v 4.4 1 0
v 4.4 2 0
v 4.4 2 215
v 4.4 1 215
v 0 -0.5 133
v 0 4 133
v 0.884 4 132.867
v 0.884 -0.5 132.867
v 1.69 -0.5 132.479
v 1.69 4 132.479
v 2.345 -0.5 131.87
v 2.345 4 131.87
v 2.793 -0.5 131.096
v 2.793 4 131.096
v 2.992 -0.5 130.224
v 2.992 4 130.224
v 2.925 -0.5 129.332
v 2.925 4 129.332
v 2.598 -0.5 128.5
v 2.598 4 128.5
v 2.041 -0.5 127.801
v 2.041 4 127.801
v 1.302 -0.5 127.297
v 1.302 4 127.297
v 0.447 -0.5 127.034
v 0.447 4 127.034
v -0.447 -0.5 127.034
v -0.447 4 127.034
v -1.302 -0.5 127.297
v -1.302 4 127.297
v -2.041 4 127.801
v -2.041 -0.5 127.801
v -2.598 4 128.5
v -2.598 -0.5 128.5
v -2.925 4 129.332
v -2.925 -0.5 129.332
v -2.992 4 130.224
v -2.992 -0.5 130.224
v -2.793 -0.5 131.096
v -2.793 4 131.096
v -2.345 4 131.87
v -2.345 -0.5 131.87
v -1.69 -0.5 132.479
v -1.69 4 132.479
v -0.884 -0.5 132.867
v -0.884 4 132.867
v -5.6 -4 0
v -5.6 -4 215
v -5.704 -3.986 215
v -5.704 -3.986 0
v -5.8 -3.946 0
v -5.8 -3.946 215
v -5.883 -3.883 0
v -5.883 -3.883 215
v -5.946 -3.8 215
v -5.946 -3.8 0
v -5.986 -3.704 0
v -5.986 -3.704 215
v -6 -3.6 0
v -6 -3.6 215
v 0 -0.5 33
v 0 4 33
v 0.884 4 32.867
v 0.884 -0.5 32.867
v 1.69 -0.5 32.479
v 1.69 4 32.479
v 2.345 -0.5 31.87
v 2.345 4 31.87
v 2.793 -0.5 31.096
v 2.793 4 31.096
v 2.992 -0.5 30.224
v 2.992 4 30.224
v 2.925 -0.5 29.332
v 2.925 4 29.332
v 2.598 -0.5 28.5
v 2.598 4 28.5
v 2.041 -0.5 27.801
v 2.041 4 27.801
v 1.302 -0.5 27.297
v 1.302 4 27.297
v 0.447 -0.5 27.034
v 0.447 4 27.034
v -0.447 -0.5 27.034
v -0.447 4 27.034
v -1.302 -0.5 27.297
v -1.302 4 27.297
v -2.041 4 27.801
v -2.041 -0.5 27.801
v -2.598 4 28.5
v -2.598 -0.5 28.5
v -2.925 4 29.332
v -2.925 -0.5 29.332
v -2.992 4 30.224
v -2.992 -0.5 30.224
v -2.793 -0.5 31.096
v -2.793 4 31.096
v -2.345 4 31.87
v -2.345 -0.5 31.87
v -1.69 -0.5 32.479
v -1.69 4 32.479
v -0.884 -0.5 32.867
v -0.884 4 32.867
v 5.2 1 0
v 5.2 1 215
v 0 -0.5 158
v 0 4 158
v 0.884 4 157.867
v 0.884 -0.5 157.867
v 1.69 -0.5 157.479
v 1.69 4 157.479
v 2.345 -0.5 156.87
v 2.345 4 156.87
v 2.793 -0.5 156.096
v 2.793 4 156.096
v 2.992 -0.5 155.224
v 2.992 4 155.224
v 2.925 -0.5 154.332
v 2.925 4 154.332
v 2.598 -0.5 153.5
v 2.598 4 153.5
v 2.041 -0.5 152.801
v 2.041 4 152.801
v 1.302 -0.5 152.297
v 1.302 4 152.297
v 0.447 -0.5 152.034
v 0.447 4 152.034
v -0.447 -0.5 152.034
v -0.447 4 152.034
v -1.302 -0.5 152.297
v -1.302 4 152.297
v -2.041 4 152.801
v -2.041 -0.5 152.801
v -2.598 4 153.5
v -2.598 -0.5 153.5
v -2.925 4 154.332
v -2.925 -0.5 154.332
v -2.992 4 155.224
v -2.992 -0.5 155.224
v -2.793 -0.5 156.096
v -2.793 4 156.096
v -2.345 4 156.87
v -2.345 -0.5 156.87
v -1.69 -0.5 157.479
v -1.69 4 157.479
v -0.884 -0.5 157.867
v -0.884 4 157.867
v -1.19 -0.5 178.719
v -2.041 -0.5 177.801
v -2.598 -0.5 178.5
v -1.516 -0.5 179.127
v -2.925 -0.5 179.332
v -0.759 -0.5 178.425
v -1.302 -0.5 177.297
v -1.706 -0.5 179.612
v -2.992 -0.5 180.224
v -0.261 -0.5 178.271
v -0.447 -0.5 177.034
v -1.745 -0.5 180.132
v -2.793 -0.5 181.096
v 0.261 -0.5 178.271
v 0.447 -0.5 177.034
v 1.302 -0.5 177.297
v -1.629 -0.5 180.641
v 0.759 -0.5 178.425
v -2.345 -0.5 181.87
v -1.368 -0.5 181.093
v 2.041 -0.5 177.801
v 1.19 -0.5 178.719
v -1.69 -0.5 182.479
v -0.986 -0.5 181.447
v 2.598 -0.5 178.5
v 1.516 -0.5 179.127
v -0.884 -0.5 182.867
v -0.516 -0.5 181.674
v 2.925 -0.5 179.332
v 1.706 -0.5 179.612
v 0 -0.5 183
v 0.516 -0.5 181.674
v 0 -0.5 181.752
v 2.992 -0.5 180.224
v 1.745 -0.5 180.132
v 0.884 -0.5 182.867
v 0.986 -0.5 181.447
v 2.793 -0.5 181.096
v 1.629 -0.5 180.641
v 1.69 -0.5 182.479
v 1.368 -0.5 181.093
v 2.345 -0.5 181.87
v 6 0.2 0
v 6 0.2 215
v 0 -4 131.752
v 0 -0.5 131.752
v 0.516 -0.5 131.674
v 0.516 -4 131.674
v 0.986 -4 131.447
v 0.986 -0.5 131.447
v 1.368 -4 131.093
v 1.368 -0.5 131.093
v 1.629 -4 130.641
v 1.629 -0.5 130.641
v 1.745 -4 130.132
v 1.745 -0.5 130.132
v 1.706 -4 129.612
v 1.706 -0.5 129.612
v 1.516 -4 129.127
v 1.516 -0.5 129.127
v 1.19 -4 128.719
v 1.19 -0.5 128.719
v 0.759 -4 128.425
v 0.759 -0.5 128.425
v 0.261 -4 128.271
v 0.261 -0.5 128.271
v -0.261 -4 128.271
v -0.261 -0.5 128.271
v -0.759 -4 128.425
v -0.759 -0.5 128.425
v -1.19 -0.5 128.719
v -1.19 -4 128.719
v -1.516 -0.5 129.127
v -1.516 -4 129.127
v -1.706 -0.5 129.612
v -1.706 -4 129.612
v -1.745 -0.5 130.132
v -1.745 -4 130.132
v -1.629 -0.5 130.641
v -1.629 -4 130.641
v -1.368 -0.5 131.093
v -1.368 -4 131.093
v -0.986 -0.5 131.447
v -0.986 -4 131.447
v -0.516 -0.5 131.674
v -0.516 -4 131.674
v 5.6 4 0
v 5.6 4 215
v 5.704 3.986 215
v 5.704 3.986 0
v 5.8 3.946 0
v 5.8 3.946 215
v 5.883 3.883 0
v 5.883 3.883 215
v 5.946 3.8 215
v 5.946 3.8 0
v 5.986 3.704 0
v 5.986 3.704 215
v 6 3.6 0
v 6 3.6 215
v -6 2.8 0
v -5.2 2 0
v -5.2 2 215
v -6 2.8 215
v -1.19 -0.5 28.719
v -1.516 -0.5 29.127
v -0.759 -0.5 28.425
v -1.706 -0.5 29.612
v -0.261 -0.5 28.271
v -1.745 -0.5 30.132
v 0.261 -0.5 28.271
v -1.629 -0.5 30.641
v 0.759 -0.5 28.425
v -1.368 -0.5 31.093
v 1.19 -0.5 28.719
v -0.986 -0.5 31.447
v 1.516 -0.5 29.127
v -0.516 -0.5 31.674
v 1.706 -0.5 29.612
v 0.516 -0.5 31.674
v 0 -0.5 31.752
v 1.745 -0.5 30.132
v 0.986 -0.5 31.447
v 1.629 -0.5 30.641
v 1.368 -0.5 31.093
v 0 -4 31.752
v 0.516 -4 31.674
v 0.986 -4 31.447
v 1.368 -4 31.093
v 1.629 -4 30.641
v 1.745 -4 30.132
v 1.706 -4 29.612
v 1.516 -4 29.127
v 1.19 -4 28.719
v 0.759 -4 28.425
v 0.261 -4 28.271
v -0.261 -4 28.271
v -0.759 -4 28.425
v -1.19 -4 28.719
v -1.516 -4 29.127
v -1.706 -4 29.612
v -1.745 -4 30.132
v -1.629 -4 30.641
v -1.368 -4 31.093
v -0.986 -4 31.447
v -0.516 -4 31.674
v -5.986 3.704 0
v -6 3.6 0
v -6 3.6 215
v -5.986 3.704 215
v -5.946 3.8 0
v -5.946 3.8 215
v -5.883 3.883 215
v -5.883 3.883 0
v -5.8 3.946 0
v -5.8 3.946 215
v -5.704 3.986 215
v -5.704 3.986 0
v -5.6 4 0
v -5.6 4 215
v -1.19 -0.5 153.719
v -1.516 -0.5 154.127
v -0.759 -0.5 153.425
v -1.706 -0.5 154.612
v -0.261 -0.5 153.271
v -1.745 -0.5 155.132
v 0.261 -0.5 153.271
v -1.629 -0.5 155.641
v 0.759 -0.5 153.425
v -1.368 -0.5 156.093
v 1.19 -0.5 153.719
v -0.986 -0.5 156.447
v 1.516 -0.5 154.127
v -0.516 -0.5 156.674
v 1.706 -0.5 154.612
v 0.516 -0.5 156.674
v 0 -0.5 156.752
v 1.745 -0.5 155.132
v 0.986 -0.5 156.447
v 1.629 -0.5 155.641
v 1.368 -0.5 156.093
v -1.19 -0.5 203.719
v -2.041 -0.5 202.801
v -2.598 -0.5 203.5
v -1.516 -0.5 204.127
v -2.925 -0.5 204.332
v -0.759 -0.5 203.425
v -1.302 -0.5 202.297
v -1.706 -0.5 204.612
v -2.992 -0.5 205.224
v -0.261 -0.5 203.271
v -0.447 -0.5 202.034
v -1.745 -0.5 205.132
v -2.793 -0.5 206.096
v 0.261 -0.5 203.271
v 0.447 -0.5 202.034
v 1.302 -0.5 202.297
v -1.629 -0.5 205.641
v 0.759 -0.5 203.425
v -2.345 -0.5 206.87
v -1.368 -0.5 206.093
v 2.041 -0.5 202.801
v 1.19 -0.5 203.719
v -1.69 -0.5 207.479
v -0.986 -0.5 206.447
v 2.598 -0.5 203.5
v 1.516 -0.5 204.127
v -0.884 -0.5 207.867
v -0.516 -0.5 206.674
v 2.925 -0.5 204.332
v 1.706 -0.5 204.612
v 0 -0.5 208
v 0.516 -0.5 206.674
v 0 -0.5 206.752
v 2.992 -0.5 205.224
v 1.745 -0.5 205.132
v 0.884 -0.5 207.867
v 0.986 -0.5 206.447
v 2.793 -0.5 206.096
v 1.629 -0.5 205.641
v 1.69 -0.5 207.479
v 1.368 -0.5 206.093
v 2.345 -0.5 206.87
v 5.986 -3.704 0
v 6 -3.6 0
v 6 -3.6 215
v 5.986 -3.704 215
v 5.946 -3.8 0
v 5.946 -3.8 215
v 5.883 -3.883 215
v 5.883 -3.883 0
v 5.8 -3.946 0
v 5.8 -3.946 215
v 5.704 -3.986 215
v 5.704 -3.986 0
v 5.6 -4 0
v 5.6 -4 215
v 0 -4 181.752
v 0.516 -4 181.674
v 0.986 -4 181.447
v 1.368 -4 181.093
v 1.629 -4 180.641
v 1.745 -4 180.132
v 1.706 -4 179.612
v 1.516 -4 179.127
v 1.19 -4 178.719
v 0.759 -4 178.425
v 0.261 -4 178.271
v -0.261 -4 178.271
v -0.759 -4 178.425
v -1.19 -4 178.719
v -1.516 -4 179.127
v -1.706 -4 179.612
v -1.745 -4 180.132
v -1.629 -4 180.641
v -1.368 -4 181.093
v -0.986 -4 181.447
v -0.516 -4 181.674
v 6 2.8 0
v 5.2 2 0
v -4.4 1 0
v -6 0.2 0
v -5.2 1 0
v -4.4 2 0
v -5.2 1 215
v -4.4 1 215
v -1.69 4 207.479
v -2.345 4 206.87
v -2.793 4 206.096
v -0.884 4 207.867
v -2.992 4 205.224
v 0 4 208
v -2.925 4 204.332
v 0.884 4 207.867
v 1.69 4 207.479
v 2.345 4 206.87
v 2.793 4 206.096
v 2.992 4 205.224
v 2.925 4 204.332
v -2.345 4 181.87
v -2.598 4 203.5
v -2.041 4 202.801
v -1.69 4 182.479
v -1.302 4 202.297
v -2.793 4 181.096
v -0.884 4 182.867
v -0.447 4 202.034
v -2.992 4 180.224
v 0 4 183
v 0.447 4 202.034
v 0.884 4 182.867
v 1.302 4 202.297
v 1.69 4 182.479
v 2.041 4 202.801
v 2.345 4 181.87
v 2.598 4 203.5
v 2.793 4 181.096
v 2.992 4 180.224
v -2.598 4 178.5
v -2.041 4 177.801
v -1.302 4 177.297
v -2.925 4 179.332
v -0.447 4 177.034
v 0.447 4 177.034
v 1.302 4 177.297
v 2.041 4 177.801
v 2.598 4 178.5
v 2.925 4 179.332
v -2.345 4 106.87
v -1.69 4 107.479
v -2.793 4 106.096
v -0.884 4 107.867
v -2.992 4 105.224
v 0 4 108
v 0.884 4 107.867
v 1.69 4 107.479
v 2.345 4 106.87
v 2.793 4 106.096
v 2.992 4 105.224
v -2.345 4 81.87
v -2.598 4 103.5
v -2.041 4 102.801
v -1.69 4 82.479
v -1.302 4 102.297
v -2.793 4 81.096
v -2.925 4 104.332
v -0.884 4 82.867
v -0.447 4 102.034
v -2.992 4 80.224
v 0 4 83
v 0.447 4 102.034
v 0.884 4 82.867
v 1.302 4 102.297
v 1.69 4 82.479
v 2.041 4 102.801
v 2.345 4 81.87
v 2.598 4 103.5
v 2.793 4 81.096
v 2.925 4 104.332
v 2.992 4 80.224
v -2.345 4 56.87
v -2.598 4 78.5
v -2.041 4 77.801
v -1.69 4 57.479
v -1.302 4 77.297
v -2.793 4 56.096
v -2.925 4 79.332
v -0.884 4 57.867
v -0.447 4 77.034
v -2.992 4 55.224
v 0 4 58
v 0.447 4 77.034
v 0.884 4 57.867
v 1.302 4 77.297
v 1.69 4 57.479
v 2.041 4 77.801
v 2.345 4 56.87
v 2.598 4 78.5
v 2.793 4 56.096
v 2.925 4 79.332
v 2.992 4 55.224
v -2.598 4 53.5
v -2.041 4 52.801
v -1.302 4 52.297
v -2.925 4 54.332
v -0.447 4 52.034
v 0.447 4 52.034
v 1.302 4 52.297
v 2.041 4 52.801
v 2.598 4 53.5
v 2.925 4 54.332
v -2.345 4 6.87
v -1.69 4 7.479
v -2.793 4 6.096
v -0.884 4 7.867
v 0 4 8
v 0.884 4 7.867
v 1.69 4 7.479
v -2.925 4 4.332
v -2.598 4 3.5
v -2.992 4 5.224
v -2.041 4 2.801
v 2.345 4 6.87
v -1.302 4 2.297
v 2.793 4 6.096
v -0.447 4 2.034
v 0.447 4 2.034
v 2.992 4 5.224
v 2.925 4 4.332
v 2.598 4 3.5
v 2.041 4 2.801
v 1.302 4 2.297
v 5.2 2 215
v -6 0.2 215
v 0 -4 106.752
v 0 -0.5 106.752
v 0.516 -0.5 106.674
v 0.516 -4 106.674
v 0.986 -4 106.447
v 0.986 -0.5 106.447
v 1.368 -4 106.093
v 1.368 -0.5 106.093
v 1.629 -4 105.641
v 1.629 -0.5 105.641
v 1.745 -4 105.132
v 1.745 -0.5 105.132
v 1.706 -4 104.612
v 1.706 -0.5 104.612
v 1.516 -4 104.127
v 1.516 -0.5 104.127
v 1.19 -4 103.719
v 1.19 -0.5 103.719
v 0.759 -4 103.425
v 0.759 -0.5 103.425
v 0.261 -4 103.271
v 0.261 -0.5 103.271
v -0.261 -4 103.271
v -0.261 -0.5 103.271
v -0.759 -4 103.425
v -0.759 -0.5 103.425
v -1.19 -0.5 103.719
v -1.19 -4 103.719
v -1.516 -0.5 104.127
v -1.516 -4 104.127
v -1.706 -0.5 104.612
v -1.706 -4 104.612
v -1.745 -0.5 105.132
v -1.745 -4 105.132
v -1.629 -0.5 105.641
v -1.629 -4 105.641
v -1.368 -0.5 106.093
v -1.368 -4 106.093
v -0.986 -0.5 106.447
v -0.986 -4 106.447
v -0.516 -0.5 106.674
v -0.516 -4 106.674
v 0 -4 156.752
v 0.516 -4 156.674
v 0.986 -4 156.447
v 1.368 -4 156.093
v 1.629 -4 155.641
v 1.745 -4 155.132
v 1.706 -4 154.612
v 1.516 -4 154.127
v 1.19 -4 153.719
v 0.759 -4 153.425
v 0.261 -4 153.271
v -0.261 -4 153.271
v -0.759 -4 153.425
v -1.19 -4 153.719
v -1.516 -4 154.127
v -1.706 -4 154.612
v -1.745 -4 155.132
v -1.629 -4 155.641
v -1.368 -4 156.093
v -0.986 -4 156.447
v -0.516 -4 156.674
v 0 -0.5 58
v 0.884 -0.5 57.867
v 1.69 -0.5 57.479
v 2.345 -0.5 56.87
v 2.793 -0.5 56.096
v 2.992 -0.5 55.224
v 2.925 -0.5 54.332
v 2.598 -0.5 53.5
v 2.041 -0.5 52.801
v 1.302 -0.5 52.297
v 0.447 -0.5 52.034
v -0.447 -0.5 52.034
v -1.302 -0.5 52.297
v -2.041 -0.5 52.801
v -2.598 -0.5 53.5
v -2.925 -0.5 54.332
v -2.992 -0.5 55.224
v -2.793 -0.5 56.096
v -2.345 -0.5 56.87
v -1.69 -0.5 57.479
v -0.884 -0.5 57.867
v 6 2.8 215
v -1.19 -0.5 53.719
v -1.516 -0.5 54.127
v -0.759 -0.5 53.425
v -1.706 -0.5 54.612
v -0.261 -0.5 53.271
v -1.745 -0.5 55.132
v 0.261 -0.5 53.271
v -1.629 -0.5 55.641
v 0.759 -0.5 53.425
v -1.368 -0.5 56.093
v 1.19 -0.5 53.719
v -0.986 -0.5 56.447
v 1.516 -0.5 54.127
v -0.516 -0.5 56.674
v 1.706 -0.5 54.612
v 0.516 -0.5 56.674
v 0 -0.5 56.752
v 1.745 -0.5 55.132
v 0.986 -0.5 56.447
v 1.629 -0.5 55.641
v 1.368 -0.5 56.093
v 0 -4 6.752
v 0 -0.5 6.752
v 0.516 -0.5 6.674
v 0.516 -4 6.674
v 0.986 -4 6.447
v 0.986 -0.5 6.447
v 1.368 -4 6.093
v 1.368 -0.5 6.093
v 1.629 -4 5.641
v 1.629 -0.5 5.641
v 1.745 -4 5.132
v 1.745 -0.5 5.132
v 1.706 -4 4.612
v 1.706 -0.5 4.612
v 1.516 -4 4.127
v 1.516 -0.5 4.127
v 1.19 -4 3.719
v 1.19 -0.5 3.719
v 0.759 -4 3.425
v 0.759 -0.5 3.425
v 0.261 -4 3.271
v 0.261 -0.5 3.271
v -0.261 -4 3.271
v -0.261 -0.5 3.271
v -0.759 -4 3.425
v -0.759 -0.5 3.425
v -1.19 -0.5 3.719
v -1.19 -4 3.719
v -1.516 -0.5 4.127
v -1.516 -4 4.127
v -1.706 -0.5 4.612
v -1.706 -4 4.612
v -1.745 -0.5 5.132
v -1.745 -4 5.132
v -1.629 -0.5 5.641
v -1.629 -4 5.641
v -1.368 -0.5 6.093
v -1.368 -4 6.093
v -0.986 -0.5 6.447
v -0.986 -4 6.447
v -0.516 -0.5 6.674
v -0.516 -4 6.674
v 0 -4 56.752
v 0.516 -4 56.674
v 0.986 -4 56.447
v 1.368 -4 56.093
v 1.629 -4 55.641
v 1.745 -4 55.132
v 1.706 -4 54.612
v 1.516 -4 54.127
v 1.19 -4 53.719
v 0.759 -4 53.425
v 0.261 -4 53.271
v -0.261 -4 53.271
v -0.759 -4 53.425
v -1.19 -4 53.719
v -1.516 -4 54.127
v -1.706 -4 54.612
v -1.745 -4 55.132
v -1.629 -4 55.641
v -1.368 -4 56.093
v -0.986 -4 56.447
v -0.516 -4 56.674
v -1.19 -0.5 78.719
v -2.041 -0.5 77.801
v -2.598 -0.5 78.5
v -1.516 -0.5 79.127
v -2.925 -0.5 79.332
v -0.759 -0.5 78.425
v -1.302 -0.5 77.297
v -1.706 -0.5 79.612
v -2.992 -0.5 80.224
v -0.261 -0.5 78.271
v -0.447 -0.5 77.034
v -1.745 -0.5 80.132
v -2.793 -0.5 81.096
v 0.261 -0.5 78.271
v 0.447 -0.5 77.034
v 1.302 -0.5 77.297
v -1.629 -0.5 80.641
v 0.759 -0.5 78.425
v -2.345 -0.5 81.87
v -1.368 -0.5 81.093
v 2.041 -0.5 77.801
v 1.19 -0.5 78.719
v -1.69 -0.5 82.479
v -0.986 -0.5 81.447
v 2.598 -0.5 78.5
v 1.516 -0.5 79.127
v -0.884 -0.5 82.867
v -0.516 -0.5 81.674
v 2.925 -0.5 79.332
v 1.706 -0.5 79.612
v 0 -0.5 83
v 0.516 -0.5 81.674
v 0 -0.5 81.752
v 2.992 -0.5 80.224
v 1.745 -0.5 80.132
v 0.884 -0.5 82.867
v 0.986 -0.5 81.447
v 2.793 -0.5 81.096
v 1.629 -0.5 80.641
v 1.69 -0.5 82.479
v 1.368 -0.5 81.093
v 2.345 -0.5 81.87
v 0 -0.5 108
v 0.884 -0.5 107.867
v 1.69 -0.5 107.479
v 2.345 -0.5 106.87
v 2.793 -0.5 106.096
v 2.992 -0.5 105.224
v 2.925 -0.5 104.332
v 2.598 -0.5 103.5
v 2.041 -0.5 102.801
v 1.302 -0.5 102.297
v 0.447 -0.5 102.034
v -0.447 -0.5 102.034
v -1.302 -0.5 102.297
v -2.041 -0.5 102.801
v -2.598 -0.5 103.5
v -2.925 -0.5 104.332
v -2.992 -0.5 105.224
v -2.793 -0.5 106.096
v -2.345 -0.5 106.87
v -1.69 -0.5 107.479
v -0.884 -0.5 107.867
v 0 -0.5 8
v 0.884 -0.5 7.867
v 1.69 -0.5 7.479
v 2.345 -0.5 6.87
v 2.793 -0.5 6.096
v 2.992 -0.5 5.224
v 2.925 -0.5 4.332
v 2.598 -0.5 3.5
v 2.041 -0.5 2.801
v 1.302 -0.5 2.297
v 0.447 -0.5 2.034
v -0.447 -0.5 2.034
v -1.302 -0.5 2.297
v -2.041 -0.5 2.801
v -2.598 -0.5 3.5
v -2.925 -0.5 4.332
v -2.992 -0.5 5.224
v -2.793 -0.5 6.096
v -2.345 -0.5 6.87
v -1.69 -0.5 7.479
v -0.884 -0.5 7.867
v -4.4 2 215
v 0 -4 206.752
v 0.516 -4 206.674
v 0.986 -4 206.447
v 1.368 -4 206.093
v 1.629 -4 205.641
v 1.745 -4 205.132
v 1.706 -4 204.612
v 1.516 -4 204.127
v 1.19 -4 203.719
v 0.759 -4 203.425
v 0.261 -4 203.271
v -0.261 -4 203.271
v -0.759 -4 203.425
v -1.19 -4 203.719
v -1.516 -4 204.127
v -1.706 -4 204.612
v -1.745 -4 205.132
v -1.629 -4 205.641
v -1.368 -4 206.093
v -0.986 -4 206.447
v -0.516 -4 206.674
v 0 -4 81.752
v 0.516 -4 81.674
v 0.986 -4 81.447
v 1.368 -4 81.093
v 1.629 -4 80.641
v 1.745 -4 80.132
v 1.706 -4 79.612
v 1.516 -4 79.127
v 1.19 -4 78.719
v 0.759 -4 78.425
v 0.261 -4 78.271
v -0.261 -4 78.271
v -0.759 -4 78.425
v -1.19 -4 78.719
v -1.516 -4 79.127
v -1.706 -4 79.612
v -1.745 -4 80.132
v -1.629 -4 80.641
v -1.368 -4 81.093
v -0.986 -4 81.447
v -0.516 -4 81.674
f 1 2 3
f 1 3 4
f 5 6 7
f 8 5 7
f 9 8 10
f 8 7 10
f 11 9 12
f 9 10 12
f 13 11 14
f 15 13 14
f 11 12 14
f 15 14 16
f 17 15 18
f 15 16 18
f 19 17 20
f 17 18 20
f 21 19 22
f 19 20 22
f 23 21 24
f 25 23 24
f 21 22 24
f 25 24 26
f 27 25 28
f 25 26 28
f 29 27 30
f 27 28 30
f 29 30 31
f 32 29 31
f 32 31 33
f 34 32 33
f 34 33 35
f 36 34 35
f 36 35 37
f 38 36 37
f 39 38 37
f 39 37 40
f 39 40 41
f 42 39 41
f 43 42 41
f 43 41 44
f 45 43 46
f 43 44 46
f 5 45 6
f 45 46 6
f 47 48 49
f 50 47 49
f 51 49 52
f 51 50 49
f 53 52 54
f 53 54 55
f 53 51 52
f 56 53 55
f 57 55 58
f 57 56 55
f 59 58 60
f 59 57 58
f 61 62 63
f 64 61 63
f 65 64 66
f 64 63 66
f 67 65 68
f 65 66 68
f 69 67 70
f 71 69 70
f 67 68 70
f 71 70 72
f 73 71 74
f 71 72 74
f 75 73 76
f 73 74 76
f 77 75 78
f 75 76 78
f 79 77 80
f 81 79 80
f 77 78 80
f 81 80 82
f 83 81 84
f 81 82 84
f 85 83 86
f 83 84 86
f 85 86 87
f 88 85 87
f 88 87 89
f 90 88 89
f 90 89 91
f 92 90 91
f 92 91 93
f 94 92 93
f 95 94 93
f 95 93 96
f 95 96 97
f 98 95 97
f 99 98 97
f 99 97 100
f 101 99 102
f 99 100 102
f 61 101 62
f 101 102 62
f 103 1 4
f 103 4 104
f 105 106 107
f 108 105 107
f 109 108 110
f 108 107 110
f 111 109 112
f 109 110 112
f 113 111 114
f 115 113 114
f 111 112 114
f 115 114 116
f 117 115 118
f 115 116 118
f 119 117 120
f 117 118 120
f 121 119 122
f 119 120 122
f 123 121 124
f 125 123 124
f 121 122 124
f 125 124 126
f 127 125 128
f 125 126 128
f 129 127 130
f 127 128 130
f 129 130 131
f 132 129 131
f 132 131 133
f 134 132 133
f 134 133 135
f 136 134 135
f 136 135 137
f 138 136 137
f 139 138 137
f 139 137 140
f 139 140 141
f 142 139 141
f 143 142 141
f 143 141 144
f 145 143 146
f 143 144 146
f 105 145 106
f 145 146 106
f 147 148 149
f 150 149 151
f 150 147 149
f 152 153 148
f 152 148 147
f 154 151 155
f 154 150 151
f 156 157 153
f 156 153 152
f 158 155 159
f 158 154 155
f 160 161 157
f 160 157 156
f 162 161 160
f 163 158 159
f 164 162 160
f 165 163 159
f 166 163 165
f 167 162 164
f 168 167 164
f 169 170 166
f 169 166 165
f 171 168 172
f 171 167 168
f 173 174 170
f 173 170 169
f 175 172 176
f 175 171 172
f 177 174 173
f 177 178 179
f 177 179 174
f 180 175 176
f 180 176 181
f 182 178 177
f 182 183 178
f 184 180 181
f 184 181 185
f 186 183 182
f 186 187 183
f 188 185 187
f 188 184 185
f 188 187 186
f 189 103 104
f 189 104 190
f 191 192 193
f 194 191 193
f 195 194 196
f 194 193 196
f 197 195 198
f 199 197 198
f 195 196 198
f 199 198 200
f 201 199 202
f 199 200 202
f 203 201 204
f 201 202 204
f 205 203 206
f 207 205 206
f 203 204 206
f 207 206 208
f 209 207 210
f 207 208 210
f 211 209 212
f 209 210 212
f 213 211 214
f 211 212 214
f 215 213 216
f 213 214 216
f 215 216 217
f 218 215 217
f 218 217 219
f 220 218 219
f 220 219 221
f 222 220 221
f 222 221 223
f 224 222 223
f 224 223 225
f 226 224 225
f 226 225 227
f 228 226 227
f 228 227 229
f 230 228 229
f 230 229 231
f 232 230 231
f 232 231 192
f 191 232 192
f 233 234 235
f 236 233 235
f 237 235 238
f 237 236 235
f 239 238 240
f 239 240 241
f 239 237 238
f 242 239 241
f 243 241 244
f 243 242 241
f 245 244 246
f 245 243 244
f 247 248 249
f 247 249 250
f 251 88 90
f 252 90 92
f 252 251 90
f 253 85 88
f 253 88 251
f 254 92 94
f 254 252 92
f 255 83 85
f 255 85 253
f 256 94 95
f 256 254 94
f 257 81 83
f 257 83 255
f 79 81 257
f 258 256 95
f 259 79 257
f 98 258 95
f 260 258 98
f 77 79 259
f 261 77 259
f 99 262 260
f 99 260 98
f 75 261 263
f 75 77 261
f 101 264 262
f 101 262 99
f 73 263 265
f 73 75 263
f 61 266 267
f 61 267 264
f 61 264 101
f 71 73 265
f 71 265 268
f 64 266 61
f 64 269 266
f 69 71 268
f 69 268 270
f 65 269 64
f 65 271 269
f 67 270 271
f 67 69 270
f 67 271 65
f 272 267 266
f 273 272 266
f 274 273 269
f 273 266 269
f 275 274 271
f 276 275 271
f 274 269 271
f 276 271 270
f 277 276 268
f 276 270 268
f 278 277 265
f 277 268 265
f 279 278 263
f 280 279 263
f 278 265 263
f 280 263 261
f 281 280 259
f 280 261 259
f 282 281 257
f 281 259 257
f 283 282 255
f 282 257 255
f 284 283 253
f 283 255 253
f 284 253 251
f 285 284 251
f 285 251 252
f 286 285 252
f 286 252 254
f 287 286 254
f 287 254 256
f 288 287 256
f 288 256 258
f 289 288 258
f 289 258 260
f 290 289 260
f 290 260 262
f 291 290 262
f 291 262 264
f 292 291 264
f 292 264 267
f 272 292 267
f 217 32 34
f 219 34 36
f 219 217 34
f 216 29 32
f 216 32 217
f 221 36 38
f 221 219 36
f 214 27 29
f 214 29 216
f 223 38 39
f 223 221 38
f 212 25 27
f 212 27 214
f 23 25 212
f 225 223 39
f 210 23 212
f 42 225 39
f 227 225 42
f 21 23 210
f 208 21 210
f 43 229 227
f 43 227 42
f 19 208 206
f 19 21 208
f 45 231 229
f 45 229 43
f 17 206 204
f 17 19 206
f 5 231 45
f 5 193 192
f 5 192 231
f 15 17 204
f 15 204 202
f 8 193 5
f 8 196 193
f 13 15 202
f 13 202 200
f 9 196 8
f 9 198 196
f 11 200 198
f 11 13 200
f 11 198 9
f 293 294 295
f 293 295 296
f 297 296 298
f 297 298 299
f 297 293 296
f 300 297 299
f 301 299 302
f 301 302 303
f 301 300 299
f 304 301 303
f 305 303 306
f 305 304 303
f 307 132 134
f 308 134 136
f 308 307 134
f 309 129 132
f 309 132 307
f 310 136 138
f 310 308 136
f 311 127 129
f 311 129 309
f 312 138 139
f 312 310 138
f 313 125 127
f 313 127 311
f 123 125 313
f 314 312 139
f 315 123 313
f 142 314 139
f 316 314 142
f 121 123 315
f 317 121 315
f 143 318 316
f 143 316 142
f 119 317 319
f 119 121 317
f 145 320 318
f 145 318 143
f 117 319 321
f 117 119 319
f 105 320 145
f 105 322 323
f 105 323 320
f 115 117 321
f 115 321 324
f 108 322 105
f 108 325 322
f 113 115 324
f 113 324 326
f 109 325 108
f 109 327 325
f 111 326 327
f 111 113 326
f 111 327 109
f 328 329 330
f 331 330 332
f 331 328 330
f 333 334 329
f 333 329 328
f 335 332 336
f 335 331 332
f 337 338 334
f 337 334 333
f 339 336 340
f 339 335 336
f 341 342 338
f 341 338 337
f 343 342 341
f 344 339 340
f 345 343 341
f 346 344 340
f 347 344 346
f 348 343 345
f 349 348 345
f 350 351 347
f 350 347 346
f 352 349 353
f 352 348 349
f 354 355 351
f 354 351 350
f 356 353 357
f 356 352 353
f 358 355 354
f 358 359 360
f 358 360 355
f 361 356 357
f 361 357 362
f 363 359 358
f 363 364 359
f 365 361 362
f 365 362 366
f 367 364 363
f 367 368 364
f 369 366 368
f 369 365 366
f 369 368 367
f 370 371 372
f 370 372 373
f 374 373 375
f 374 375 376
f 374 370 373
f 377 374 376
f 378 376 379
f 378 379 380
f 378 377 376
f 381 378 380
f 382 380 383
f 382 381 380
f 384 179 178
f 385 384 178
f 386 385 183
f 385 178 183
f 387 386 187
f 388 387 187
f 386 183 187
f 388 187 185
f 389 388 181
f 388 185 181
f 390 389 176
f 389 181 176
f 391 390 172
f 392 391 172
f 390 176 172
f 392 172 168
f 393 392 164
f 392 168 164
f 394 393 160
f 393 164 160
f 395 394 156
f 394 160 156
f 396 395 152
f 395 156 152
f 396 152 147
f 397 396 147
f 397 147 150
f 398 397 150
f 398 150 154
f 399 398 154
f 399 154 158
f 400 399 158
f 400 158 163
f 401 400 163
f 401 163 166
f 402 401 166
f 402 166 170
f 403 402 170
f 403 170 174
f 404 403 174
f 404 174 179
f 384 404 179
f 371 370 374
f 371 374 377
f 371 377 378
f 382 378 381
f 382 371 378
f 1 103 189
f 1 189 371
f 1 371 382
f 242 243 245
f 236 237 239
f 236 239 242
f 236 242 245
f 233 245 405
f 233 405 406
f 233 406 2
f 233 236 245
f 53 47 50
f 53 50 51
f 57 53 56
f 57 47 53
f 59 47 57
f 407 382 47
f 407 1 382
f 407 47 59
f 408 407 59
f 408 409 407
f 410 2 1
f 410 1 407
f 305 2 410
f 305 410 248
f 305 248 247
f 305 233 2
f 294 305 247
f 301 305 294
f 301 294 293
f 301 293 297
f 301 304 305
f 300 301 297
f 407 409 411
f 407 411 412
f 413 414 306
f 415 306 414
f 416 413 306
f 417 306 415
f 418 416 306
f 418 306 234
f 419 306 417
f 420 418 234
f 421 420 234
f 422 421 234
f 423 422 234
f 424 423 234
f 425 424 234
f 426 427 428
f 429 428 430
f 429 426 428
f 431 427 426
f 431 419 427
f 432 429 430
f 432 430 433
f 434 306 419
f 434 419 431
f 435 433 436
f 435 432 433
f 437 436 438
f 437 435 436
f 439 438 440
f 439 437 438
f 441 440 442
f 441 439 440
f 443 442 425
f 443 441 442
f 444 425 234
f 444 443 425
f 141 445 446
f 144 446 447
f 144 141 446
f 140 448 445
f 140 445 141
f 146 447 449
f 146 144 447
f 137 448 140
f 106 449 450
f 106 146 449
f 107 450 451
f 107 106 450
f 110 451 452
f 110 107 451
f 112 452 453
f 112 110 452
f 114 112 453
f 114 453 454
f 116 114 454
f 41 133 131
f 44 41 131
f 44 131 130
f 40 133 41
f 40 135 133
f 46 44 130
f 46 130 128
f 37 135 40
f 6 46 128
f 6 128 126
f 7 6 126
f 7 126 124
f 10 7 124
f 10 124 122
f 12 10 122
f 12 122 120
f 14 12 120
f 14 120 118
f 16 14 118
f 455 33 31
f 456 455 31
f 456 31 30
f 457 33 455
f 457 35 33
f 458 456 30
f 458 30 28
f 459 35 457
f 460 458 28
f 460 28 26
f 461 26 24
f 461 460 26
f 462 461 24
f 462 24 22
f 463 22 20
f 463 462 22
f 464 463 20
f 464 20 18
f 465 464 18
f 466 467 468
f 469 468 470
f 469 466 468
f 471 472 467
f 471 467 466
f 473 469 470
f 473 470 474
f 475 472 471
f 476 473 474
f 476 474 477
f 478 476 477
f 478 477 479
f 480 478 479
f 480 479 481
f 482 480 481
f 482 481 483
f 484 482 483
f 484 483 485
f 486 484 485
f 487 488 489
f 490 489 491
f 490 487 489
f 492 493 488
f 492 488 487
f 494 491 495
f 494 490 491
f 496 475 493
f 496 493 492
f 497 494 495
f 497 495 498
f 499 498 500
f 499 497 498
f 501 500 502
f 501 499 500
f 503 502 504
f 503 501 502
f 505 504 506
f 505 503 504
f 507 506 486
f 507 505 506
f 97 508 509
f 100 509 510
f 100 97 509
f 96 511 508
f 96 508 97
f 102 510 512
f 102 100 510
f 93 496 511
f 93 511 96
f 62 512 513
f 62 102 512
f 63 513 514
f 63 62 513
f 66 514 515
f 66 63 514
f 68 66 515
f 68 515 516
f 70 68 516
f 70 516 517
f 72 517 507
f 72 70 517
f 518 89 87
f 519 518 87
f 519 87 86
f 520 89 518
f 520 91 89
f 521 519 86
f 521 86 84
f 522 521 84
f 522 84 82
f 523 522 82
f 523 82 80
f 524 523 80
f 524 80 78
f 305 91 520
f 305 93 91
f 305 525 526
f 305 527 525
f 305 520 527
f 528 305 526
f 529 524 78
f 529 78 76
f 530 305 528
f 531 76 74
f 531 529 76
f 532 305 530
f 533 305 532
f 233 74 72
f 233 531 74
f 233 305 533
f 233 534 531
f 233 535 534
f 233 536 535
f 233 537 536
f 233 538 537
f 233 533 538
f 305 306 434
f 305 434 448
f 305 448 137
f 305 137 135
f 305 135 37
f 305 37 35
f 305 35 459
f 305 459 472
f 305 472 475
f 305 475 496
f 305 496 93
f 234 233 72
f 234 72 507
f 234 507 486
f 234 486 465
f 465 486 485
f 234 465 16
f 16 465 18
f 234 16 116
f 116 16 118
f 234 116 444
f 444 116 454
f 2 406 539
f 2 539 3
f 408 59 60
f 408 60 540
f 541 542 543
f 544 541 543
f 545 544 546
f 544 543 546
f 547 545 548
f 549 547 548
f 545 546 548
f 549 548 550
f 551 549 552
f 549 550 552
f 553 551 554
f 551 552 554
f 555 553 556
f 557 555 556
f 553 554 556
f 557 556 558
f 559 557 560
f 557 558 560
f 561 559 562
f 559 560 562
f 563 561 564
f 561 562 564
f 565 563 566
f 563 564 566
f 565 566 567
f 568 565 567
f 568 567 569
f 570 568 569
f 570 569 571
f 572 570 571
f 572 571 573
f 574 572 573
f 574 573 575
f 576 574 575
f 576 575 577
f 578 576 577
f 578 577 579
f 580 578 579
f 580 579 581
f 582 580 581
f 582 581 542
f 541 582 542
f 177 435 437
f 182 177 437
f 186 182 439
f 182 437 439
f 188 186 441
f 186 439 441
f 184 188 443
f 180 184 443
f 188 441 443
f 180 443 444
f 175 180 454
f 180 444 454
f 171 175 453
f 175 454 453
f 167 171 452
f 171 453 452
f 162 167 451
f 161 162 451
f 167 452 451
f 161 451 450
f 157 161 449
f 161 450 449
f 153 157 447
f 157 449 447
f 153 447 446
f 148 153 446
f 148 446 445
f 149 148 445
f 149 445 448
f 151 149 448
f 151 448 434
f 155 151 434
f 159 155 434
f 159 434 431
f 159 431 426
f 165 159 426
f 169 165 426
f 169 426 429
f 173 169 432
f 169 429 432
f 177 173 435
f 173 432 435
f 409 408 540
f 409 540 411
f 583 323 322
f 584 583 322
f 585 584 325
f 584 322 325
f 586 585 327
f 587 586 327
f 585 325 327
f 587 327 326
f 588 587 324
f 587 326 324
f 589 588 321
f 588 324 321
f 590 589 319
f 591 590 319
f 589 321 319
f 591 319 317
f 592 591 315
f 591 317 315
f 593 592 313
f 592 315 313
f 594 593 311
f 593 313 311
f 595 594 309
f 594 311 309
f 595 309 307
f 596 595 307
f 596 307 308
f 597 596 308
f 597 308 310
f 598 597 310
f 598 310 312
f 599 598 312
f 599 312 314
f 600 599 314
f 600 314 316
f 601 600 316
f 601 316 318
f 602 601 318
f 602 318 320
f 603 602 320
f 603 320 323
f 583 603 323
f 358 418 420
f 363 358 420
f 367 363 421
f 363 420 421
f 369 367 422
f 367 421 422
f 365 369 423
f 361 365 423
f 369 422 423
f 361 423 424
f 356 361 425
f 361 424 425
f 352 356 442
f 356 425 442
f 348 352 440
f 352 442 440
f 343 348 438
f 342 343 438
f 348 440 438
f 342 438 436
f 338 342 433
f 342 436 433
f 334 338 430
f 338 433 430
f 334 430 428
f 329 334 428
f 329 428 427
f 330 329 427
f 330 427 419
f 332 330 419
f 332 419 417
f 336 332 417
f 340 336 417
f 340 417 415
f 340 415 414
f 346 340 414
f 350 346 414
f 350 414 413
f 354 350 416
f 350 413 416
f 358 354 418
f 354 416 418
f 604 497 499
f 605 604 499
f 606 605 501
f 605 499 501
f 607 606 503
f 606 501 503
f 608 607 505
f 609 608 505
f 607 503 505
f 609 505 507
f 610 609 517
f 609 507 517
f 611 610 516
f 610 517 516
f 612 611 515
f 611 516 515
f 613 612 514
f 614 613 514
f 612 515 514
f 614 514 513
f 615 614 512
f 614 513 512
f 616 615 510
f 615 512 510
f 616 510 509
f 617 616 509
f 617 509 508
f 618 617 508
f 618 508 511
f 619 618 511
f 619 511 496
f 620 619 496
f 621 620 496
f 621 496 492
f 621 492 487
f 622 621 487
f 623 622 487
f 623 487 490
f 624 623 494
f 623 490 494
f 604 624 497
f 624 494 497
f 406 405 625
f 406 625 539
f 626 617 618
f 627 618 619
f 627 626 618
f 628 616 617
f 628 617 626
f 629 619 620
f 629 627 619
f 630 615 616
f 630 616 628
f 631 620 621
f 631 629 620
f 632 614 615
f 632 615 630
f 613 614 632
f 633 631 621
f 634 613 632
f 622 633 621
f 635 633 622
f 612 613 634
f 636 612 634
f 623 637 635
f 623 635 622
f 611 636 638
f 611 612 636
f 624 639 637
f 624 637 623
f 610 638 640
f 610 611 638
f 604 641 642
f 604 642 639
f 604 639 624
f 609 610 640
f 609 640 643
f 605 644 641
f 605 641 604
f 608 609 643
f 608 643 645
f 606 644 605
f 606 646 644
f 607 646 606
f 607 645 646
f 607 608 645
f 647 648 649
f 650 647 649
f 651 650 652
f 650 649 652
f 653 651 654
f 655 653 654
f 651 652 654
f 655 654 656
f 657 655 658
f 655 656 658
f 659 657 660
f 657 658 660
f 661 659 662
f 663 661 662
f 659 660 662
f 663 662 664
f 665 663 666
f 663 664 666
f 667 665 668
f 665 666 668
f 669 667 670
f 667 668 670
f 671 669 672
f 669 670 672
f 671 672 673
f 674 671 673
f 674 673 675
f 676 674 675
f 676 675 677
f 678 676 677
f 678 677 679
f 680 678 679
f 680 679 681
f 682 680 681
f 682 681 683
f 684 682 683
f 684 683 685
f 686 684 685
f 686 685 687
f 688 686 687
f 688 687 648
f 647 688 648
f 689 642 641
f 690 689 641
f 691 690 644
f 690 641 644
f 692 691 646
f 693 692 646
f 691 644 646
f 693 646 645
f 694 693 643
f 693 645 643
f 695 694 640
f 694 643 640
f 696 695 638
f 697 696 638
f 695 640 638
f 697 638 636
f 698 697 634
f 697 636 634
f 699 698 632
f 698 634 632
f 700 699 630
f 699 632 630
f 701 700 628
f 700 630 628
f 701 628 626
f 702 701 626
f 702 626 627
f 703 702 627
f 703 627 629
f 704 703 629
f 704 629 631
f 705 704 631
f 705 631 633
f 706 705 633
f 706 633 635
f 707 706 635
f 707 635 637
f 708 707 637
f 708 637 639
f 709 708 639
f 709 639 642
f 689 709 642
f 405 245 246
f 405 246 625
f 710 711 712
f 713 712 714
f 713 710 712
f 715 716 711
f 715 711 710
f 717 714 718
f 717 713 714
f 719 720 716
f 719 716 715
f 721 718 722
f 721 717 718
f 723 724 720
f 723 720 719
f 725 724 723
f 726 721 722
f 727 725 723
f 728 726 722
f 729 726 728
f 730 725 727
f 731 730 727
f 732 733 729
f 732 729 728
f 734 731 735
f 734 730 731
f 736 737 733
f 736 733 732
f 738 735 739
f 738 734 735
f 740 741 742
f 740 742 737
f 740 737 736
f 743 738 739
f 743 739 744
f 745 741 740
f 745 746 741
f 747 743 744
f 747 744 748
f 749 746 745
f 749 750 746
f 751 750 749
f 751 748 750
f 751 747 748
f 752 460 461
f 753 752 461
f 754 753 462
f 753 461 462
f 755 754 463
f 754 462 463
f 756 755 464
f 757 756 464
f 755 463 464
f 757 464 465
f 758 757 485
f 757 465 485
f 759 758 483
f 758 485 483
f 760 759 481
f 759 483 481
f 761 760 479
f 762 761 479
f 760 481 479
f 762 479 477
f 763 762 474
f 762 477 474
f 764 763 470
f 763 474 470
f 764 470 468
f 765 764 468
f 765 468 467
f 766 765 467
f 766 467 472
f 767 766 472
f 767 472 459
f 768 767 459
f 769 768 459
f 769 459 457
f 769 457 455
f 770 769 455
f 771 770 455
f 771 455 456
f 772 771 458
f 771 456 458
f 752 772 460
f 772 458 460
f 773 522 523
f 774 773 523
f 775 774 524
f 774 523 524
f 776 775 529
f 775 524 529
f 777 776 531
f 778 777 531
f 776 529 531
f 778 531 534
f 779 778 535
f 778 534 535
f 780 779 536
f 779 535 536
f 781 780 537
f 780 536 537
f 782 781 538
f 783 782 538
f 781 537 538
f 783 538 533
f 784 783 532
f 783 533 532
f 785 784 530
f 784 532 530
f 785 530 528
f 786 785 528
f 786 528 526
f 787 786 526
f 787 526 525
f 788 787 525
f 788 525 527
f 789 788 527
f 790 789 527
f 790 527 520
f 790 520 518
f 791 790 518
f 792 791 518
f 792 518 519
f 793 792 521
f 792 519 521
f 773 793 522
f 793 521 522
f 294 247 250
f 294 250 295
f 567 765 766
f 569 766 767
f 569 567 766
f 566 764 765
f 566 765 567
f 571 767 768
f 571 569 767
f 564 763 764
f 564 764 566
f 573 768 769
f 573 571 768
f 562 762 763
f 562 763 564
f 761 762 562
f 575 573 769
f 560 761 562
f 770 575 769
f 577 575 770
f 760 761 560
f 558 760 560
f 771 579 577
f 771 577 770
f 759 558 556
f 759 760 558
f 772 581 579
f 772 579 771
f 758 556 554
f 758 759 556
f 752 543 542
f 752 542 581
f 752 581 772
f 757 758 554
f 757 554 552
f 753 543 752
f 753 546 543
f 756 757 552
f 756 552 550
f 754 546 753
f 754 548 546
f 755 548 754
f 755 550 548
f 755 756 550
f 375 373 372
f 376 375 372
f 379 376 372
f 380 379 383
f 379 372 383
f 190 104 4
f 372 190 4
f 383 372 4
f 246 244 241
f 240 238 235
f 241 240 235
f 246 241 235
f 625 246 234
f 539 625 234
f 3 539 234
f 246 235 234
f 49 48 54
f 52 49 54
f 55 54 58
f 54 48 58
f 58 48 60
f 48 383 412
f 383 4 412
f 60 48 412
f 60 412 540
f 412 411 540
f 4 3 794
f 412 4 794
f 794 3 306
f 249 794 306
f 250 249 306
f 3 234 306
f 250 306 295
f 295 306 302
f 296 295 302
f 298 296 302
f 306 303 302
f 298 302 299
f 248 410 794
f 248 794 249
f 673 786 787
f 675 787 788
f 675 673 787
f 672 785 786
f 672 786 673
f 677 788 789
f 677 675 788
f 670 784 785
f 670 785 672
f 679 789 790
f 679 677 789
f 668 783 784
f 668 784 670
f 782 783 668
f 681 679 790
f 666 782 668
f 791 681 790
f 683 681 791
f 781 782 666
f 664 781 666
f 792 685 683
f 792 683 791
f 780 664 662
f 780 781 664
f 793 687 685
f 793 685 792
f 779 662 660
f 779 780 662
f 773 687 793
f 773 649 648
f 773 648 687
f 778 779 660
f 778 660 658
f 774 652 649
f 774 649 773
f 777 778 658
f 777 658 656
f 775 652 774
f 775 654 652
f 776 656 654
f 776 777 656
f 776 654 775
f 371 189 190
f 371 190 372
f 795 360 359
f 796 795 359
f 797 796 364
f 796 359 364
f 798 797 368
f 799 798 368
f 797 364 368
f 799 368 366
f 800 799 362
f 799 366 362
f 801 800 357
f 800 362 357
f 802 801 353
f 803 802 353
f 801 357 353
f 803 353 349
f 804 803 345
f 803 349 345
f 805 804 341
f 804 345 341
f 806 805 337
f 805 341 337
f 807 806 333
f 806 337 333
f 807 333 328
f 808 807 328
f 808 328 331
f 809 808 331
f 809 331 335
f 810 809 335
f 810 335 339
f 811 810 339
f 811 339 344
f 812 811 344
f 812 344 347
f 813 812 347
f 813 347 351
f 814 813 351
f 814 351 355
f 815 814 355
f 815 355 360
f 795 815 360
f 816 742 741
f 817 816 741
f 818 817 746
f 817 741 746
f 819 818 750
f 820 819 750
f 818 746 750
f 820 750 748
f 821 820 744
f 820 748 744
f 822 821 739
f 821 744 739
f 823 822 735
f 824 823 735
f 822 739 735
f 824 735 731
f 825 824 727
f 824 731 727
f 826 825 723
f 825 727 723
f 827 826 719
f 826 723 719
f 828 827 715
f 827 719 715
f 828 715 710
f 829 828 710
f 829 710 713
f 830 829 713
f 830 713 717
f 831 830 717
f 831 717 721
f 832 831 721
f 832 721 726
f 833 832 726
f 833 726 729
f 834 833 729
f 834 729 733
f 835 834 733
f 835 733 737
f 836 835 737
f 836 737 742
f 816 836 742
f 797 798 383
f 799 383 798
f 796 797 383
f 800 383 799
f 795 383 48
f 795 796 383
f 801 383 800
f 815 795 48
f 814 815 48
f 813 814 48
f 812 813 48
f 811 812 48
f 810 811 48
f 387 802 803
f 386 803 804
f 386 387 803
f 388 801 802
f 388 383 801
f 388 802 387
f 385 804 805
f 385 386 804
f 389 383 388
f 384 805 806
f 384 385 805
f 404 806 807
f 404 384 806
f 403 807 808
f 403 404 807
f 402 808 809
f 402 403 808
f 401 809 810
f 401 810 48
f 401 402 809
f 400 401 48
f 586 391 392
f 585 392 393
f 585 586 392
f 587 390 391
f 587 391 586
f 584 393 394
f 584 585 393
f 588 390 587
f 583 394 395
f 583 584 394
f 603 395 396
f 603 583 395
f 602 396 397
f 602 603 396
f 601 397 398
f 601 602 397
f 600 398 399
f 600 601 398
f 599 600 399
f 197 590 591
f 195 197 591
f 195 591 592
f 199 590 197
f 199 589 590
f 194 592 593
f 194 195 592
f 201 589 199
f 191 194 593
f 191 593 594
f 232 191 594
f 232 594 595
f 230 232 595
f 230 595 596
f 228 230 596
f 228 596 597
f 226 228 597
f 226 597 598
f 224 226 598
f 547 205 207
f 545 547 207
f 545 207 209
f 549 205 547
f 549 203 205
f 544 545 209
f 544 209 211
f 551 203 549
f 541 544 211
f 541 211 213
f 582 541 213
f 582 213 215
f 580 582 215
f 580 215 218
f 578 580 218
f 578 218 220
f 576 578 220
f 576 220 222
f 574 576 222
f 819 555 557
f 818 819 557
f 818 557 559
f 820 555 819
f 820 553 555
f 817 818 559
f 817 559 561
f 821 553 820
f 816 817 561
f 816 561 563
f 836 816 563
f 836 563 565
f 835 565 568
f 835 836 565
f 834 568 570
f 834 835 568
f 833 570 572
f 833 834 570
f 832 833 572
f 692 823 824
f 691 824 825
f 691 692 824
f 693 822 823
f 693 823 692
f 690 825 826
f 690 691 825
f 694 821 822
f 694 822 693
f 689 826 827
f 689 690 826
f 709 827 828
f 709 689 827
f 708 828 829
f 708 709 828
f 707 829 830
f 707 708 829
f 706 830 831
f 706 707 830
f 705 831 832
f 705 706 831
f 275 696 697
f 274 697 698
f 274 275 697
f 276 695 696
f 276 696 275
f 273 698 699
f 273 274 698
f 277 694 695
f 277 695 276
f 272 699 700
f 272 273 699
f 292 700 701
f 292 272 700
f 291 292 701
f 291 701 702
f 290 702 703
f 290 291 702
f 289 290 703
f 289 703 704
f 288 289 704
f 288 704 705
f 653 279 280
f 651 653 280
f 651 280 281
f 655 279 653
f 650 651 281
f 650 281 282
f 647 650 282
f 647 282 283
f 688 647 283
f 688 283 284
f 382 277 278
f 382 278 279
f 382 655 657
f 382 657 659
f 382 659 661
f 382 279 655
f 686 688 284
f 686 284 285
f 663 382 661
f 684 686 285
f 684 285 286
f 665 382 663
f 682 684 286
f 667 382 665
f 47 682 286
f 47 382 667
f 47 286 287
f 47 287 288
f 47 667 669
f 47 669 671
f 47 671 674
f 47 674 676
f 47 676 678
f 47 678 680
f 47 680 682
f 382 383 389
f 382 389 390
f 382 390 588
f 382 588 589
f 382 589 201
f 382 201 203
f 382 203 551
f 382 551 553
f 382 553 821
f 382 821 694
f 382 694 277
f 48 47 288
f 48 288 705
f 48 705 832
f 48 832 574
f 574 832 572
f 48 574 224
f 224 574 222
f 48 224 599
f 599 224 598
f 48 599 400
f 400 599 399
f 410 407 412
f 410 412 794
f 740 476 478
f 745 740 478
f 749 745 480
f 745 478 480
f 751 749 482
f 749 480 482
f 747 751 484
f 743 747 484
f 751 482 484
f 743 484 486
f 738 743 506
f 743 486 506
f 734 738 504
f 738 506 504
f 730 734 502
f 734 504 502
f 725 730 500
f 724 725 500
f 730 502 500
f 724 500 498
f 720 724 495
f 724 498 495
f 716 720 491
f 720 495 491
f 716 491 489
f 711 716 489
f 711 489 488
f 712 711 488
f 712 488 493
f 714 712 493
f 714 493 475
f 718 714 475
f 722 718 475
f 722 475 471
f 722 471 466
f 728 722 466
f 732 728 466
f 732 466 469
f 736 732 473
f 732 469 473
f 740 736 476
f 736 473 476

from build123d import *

# Parameters (mm, degrees)
BOSS_EXTRUDE1_DEPTH = 215
SKETCH2_R           = 3
CUT_EXTRUDE1_DEPTH  = 4.5
SKETCH3_R           = 1.75
CUT_EXTRUDE2_DEPTH  = 216.2324325


with BuildPart() as part:
    # Sketch1 → Boss-Extrude1 (new body)
    with BuildSketch(Plane.XY):
        with BuildLine():
            Line((-5.6, 4), (5.6, 4))
            ThreePointArc((5.6, 4), (5.882842712, 3.882842712), (6, 3.6))
            Line((6, 3.6), (6, 2.8))
            Line((6, 2.8), (5.2, 2))
            Line((5.2, 2), (4.4, 2))
            Line((4.4, 2), (4.4, 1))
            Line((4.4, 1), (5.2, 1))
            Line((5.2, 1), (6, 0.2))
            Line((6, 0.2), (6, -3.6))
            ThreePointArc((6, -3.6), (5.882842712, -3.882842712), (5.6, -4))
            Line((5.6, -4), (-5.6, -4))
            ThreePointArc((-5.6, -4), (-5.882842712, -3.882842712), (-6, -3.6))
            Line((-6, -3.6), (-6, 0.2))
            Line((-6, 0.2), (-5.2, 1))
            Line((-5.2, 1), (-4.4, 1))
            Line((-4.4, 1), (-4.4, 2))
            Line((-4.4, 2), (-5.2, 2))
            Line((-5.2, 2), (-6, 2.8))
            Line((-6, 2.8), (-6, 3.6))
            ThreePointArc((-6, 3.6), (-5.882842712, 3.882842712), (-5.6, 4))
        make_face()
    extrude(amount=BOSS_EXTRUDE1_DEPTH)

    # Sketch2 → Cut-Extrude1 (cut)
    with BuildSketch(Plane(origin=(0, 4, 0), x_dir=(1, 0, 0), z_dir=(0, 1, 0))):
        with Locations(Location((0, -205, 0), (0, 0, 270))):
            Circle(SKETCH2_R)
        with Locations(Location((0, -180, 0), (0, 0, 270))):
            Circle(SKETCH2_R)
        with Locations(Location((0, -155, 0), (0, 0, 270))):
            Circle(SKETCH2_R)
        with Locations(Location((0, -130, 0), (0, 0, 270))):
            Circle(SKETCH2_R)
        with Locations(Location((0, -105, 0), (0, 0, 270))):
            Circle(SKETCH2_R)
        with Locations(Location((0, -80, 0), (0, 0, 270))):
            Circle(SKETCH2_R)
        with Locations(Location((0, -55, 0), (0, 0, 270))):
            Circle(SKETCH2_R)
        with Locations(Location((0, -30, 0), (0, 0, 270))):
            Circle(SKETCH2_R)
        with Locations(Location((0, -5, 0), (0, 0, 270))):
            Circle(SKETCH2_R)
        with Locations((0, 20)):
            Circle(SKETCH2_R)
        with Locations((0, 45)):
            Circle(SKETCH2_R)
        with Locations((0, 70)):
            Circle(SKETCH2_R)
        with Locations((0, 95)):
            Circle(SKETCH2_R)
        with Locations((0, 120)):
            Circle(SKETCH2_R)
        with Locations((0, 145)):
            Circle(SKETCH2_R)
        with Locations((0, 170)):
            Circle(SKETCH2_R)
        with Locations((0, 195)):
            Circle(SKETCH2_R)
        with Locations((0, 220)):
            Circle(SKETCH2_R)
    extrude(amount=-CUT_EXTRUDE1_DEPTH, mode=Mode.SUBTRACT)

    # Sketch3 → Cut-Extrude2 (cut, through all)
    with BuildSketch(Plane(origin=(0, 4, 0), x_dir=(1, 0, 0), z_dir=(0, 1, 0))):
        with Locations(Location((0, -205.001504258, 0), (0, 0, 270))):
            Circle(SKETCH3_R)
        with Locations(Location((0, -180.001504258, 0), (0, 0, 270))):
            Circle(SKETCH3_R)
        with Locations(Location((0, -155.001504258, 0), (0, 0, 270))):
            Circle(SKETCH3_R)
        with Locations(Location((0, -130.001504258, 0), (0, 0, 270))):
            Circle(SKETCH3_R)
        with Locations(Location((0, -105.001504258, 0), (0, 0, 270))):
            Circle(SKETCH3_R)
        with Locations(Location((0, -80.001504258, 0), (0, 0, 270))):
            Circle(SKETCH3_R)
        with Locations(Location((0, -55.001504258, 0), (0, 0, 270))):
            Circle(SKETCH3_R)
        with Locations(Location((0, -30.001504258, 0), (0, 0, 270))):
            Circle(SKETCH3_R)
        with Locations(Location((0, -5.001504258, 0), (0, 0, 270))):
            Circle(SKETCH3_R)
        with Locations((0, 19.998495742)):
            Circle(SKETCH3_R)
        with Locations((0, 44.998495742)):
            Circle(SKETCH3_R)
        with Locations((0, 69.998495742)):
            Circle(SKETCH3_R)
        with Locations((0, 94.998495742)):
            Circle(SKETCH3_R)
        with Locations((0, 119.998495742)):
            Circle(SKETCH3_R)
        with Locations((0, 144.998495742)):
            Circle(SKETCH3_R)
    extrude(amount=-CUT_EXTRUDE2_DEPTH, mode=Mode.SUBTRACT)


solid = part.part
